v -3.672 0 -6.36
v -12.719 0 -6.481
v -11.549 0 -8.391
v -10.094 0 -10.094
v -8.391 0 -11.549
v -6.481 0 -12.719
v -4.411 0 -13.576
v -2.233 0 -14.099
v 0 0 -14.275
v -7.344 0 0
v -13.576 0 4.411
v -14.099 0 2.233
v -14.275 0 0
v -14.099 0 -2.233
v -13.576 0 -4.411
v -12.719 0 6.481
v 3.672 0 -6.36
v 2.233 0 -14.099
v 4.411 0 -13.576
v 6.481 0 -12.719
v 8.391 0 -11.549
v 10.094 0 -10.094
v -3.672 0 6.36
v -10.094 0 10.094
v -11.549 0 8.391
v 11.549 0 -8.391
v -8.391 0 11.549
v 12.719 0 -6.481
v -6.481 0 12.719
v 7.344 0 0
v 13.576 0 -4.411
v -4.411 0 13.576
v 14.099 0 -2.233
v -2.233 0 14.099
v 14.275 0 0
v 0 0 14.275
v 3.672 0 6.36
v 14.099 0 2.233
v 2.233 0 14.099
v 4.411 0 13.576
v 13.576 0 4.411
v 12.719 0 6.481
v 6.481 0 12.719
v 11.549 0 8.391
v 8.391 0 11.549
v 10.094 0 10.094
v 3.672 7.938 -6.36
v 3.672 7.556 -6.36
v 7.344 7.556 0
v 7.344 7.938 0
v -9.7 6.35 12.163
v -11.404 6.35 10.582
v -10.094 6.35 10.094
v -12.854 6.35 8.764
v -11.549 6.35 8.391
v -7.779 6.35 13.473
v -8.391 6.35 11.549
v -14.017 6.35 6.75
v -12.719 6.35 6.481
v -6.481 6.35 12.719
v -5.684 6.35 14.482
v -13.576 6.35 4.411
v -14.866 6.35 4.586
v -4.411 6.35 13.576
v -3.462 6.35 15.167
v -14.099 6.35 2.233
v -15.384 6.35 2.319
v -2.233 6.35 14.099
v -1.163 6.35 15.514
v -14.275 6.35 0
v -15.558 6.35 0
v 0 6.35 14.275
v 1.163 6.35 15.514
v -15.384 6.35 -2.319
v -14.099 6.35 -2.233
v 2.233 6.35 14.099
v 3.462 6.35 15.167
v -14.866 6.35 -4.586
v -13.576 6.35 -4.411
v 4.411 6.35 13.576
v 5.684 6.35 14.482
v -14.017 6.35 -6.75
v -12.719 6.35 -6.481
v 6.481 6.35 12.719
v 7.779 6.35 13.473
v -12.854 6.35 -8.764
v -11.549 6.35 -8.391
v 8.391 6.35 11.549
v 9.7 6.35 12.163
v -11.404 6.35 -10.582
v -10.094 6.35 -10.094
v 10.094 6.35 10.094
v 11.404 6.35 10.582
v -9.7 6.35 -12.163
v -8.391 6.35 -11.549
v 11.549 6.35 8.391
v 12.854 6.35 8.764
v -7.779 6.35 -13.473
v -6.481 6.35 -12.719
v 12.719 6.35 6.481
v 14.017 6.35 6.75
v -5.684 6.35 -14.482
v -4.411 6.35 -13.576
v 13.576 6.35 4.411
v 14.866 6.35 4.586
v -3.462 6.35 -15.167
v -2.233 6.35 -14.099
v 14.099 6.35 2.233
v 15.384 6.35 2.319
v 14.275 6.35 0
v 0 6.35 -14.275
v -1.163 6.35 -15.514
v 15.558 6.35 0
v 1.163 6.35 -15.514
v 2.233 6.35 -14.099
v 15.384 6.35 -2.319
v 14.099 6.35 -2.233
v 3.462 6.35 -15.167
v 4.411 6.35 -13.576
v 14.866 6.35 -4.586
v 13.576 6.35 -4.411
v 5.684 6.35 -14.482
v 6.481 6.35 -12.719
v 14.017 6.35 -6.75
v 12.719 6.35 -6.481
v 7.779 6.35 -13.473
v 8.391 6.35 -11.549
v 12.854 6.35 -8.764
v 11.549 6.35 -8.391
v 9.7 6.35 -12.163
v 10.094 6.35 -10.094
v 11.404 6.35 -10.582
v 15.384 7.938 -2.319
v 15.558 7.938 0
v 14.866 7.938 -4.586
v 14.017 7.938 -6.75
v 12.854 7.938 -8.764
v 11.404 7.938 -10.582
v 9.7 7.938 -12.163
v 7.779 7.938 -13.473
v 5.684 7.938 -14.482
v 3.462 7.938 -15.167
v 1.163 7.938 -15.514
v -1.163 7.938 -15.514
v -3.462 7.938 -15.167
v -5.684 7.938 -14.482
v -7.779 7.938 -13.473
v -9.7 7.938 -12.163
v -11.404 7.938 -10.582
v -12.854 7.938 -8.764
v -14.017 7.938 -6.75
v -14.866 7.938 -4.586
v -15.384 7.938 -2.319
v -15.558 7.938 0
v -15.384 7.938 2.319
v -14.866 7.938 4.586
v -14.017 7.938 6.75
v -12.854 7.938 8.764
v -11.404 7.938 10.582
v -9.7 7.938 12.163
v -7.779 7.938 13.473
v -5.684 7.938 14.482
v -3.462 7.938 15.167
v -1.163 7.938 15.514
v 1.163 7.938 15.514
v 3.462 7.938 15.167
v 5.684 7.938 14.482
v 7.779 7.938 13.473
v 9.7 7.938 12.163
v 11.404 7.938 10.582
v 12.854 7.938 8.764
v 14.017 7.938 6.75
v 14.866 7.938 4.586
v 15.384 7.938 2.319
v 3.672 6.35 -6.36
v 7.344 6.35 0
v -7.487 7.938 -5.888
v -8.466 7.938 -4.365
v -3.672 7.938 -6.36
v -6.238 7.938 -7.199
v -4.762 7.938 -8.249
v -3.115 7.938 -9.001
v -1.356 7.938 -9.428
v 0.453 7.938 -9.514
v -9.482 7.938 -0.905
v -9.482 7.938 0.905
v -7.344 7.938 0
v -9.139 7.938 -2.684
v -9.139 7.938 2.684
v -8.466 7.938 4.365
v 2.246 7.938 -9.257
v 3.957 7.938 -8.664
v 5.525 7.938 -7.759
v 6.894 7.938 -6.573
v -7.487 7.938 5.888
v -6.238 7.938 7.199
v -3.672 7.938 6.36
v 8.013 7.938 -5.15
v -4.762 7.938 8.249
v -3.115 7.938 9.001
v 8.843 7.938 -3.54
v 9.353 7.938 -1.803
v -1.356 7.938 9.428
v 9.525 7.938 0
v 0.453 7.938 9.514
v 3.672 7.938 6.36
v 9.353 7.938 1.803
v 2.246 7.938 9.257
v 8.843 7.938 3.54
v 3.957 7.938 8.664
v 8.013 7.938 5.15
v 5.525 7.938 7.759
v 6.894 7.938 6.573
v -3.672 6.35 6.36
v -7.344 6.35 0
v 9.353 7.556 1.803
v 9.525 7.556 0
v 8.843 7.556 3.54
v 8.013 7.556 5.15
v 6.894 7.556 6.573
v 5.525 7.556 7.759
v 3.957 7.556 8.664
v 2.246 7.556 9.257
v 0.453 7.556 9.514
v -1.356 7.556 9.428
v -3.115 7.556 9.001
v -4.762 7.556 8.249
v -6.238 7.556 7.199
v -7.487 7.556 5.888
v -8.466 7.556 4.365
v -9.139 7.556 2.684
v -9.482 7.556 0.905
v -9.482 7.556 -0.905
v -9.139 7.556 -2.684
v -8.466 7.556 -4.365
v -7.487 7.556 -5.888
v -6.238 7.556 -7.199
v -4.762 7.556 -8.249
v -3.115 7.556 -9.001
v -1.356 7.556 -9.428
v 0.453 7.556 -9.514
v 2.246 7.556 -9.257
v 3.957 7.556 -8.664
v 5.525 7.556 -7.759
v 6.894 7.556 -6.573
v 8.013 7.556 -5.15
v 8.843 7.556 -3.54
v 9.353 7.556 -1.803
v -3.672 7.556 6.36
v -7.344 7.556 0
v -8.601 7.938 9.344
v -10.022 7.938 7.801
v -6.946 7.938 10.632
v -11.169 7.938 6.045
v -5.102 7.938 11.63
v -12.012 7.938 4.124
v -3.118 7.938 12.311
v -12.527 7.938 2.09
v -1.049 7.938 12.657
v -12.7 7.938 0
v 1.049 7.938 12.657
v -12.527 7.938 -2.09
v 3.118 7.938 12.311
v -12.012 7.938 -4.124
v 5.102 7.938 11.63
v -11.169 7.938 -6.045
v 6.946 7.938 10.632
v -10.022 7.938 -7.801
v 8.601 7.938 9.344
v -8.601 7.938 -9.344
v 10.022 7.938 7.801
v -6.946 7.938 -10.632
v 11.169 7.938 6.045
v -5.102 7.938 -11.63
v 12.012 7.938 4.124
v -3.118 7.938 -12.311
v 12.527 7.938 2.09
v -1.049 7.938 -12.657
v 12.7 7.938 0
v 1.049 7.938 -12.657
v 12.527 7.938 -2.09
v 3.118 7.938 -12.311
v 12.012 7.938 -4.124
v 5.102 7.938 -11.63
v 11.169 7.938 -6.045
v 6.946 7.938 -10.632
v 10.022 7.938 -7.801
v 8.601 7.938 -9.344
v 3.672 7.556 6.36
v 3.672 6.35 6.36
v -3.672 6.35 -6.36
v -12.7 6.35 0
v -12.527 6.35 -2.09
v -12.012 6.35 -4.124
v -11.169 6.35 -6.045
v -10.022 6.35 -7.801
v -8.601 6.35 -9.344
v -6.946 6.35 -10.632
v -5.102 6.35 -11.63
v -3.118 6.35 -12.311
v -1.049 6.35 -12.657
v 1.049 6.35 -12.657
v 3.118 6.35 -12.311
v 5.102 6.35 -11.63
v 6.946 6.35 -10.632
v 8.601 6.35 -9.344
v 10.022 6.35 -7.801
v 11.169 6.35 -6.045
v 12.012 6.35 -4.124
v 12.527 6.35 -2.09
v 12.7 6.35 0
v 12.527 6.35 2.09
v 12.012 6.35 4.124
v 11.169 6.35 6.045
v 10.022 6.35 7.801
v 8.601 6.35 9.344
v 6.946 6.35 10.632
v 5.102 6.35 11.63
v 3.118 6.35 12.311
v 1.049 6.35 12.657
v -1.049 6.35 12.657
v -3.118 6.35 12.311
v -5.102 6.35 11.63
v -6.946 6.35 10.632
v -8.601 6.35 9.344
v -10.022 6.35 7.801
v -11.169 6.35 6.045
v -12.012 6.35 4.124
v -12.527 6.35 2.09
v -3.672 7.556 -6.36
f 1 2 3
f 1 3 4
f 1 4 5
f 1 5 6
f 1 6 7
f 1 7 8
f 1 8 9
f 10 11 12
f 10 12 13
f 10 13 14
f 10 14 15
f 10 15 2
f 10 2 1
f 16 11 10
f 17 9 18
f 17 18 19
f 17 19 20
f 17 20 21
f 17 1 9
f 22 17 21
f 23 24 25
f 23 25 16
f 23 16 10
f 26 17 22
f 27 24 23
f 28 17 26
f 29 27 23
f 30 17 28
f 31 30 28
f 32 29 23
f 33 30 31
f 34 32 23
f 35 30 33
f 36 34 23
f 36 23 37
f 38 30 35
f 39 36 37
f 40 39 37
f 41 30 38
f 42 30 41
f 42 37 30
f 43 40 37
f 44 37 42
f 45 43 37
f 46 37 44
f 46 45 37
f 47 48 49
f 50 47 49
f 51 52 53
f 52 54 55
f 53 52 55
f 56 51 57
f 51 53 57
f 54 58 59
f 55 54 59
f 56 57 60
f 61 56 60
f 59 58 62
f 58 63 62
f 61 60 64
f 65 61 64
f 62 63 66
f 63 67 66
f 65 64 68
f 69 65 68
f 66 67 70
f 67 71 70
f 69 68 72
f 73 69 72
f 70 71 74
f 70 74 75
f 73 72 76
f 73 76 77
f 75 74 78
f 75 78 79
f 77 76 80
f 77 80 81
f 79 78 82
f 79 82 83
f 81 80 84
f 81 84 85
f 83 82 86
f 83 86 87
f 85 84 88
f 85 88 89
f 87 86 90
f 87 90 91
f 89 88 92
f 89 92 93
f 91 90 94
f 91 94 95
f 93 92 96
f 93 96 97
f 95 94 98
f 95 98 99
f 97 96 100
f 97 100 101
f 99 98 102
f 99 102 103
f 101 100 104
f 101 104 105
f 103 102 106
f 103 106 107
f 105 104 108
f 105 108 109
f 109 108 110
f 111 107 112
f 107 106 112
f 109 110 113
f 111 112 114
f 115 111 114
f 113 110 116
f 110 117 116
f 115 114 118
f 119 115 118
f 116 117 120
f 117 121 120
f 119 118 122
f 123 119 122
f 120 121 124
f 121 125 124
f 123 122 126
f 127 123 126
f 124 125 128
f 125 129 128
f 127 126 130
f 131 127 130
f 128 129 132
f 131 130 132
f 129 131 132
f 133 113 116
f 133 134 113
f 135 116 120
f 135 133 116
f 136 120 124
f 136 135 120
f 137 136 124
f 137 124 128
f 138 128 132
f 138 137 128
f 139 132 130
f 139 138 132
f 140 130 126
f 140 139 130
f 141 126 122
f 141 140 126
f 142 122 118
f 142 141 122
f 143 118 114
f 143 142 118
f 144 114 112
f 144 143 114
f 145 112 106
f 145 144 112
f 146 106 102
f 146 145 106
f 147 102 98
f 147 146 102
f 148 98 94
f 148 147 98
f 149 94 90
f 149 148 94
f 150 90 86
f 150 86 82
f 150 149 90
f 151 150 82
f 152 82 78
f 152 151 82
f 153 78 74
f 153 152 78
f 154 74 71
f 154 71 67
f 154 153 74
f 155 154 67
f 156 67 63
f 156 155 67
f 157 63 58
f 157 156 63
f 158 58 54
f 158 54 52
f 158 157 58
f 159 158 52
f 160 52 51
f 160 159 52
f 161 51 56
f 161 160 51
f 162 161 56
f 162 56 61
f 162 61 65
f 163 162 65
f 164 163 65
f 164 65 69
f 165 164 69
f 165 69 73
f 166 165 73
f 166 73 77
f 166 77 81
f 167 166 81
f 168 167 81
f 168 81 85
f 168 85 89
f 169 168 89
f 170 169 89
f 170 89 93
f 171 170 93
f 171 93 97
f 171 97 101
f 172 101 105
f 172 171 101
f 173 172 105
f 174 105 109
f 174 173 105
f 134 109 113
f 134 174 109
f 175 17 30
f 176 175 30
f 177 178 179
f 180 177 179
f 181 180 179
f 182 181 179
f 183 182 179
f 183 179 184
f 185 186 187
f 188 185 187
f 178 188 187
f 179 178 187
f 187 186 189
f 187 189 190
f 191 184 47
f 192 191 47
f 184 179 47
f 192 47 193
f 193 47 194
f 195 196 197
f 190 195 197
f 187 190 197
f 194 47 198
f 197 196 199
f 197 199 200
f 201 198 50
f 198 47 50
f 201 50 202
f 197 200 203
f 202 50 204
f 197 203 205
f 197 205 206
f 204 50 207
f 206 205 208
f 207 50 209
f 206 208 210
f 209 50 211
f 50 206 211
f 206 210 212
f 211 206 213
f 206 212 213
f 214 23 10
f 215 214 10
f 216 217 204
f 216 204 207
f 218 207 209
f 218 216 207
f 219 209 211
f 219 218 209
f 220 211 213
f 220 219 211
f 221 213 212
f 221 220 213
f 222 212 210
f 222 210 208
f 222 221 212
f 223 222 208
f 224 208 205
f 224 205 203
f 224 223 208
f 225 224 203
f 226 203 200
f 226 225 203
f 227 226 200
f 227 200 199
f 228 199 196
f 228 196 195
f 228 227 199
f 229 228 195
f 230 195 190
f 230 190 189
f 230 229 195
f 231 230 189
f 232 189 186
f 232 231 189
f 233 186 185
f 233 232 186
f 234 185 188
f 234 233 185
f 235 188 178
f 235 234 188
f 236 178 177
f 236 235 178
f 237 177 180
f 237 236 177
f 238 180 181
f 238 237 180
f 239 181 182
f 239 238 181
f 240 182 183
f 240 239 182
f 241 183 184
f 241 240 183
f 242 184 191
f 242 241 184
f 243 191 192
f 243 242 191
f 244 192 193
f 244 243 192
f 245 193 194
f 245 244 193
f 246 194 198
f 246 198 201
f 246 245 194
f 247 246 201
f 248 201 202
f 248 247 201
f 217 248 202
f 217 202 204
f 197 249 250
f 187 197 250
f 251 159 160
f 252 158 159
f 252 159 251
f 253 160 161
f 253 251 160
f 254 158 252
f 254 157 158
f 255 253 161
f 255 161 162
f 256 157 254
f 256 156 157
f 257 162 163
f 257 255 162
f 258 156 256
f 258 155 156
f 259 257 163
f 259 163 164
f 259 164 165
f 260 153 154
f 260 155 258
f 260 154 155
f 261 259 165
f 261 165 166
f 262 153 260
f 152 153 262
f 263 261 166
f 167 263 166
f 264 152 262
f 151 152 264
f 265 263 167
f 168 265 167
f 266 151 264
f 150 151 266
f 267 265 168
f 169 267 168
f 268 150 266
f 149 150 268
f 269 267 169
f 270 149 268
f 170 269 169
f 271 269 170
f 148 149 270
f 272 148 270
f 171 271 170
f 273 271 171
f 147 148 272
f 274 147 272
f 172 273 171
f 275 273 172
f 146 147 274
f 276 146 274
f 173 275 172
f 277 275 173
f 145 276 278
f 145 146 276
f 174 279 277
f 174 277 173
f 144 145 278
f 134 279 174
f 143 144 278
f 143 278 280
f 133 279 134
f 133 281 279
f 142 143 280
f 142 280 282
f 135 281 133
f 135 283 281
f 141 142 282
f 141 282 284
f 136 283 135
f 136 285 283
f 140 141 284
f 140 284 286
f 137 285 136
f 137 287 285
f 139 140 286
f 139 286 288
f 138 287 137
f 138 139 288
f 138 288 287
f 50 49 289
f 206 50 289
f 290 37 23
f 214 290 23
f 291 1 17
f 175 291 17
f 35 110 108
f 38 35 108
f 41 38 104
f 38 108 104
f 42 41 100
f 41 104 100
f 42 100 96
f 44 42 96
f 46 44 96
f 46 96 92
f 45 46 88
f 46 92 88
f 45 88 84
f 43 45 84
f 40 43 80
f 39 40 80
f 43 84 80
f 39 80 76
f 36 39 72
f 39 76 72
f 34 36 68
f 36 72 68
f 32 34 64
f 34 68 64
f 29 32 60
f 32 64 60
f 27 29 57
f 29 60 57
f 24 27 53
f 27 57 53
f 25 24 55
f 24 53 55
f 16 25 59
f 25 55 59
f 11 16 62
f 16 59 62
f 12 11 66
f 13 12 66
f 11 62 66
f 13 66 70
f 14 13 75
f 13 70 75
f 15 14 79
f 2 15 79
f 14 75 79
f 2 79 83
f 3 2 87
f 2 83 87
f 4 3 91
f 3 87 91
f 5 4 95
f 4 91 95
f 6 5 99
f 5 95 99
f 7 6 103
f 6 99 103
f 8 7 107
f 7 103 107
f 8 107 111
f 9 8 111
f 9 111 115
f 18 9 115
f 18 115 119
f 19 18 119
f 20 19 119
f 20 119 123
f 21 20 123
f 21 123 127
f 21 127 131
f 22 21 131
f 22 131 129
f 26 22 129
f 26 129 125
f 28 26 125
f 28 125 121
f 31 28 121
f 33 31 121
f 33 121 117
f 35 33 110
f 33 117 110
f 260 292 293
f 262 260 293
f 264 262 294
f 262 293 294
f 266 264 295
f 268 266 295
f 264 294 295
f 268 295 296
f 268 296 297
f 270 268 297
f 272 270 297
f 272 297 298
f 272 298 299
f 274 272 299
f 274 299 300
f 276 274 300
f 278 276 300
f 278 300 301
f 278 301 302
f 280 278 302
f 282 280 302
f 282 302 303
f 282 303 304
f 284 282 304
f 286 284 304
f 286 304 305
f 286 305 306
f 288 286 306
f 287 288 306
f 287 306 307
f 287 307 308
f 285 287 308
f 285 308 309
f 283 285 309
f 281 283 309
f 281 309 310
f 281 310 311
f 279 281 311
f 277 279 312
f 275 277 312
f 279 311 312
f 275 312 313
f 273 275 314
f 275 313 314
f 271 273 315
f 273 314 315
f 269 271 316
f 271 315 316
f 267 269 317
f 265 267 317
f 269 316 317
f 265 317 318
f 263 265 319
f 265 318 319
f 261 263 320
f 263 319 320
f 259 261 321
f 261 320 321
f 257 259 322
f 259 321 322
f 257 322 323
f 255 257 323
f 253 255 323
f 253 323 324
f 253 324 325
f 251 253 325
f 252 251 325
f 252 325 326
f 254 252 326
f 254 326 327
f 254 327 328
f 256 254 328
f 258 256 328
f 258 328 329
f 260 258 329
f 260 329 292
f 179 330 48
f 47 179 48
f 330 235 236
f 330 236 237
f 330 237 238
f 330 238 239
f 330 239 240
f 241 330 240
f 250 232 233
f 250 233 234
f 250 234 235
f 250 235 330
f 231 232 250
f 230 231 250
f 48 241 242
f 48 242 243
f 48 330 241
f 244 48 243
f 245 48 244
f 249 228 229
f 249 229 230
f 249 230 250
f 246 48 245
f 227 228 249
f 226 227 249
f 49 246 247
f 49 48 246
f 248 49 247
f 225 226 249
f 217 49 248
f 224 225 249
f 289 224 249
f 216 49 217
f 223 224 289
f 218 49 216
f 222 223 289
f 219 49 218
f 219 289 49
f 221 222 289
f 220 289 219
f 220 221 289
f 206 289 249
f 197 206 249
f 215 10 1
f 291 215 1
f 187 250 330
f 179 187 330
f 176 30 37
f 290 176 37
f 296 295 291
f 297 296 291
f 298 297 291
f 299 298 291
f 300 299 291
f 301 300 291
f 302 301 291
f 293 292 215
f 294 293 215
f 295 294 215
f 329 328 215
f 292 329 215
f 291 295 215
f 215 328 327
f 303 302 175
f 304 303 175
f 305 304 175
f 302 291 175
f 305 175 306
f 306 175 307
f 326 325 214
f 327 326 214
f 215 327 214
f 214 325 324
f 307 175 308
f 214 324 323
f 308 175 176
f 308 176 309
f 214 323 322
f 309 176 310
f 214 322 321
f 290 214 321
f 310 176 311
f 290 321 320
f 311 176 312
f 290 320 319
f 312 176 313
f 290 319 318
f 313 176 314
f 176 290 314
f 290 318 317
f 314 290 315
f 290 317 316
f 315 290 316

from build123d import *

# Parameters (mm, degrees)
SKETCH1_W                  = 15.5575
SKETCH1_H                  = 1.5875
F_1_1_DIAMETER_HOLE1_D     = 25.4
F_1_1_DIAMETER_HOLE1_DEPTH = 1.5875
SKETCH4_R                  = 9.525
BOSS_EXTRUDE1_DEPTH        = 0.381
SKETCH5_R                  = 14.2748
BOSS_EXTRUDE2_DEPTH        = 6.35
CUT_EXTRUDE1_DEPTH         = 8.9375


with BuildPart() as part:
    # Sketch1 → Revolve1 (revolve)
    with BuildSketch(Plane(origin=(0, 0, 0), x_dir=(-1, 0, 0), z_dir=(0, 0, -1))):
        with Locations((-7.77875, 7.14375)):
            Rectangle(SKETCH1_W, SKETCH1_H)
    revolve(axis=Axis((0, 6.35, 0), (0, 1, 0)))

    # 1 (1) Diameter Hole1
    with Locations(Plane(origin=(0, 7.9375, 0), x_dir=(1, 0, 0), z_dir=(0, 1, 0))):
        with Locations((0, 0)):
            Hole(F_1_1_DIAMETER_HOLE1_D / 2, depth=F_1_1_DIAMETER_HOLE1_DEPTH)

    # Sketch5 → Boss-Extrude2 (add)
    with BuildSketch(Plane.XZ.offset(-6.35)):
        Circle(SKETCH5_R)
    extrude(amount=BOSS_EXTRUDE2_DEPTH)


with BuildPart() as body_2:
    # Sketch4 → Boss-Extrude1 (new body)
    with BuildSketch(Plane.XZ.offset(-7.5565)):
        Circle(SKETCH4_R)
    extrude(amount=-BOSS_EXTRUDE1_DEPTH)


with BuildPart() as cut_extrude1_tool:
    # Sketch6 → Cut-Extrude1 (new body, through all)
    with BuildSketch(Plane.XZ):
        Polygon((-3.671947712, 6.36), (-7.343895424, 0), (-3.671947712, -6.36), (3.671947712, -6.36), (7.343895424, 0), (3.671947712, 6.36), align=None)
    extrude(amount=-CUT_EXTRUDE1_DEPTH)


with BuildPart() as part_1:
    add(part.part)

    # Cut-Extrude1: cut by cut_extrude1_tool
    add(cut_extrude1_tool.part, mode=Mode.SUBTRACT)


with BuildPart() as body_2_1:
    add(body_2.part)

    # Cut-Extrude1: cut by cut_extrude1_tool
    add(cut_extrude1_tool.part, mode=Mode.SUBTRACT)


solid = Compound([part_1.part, body_2_1.part])
